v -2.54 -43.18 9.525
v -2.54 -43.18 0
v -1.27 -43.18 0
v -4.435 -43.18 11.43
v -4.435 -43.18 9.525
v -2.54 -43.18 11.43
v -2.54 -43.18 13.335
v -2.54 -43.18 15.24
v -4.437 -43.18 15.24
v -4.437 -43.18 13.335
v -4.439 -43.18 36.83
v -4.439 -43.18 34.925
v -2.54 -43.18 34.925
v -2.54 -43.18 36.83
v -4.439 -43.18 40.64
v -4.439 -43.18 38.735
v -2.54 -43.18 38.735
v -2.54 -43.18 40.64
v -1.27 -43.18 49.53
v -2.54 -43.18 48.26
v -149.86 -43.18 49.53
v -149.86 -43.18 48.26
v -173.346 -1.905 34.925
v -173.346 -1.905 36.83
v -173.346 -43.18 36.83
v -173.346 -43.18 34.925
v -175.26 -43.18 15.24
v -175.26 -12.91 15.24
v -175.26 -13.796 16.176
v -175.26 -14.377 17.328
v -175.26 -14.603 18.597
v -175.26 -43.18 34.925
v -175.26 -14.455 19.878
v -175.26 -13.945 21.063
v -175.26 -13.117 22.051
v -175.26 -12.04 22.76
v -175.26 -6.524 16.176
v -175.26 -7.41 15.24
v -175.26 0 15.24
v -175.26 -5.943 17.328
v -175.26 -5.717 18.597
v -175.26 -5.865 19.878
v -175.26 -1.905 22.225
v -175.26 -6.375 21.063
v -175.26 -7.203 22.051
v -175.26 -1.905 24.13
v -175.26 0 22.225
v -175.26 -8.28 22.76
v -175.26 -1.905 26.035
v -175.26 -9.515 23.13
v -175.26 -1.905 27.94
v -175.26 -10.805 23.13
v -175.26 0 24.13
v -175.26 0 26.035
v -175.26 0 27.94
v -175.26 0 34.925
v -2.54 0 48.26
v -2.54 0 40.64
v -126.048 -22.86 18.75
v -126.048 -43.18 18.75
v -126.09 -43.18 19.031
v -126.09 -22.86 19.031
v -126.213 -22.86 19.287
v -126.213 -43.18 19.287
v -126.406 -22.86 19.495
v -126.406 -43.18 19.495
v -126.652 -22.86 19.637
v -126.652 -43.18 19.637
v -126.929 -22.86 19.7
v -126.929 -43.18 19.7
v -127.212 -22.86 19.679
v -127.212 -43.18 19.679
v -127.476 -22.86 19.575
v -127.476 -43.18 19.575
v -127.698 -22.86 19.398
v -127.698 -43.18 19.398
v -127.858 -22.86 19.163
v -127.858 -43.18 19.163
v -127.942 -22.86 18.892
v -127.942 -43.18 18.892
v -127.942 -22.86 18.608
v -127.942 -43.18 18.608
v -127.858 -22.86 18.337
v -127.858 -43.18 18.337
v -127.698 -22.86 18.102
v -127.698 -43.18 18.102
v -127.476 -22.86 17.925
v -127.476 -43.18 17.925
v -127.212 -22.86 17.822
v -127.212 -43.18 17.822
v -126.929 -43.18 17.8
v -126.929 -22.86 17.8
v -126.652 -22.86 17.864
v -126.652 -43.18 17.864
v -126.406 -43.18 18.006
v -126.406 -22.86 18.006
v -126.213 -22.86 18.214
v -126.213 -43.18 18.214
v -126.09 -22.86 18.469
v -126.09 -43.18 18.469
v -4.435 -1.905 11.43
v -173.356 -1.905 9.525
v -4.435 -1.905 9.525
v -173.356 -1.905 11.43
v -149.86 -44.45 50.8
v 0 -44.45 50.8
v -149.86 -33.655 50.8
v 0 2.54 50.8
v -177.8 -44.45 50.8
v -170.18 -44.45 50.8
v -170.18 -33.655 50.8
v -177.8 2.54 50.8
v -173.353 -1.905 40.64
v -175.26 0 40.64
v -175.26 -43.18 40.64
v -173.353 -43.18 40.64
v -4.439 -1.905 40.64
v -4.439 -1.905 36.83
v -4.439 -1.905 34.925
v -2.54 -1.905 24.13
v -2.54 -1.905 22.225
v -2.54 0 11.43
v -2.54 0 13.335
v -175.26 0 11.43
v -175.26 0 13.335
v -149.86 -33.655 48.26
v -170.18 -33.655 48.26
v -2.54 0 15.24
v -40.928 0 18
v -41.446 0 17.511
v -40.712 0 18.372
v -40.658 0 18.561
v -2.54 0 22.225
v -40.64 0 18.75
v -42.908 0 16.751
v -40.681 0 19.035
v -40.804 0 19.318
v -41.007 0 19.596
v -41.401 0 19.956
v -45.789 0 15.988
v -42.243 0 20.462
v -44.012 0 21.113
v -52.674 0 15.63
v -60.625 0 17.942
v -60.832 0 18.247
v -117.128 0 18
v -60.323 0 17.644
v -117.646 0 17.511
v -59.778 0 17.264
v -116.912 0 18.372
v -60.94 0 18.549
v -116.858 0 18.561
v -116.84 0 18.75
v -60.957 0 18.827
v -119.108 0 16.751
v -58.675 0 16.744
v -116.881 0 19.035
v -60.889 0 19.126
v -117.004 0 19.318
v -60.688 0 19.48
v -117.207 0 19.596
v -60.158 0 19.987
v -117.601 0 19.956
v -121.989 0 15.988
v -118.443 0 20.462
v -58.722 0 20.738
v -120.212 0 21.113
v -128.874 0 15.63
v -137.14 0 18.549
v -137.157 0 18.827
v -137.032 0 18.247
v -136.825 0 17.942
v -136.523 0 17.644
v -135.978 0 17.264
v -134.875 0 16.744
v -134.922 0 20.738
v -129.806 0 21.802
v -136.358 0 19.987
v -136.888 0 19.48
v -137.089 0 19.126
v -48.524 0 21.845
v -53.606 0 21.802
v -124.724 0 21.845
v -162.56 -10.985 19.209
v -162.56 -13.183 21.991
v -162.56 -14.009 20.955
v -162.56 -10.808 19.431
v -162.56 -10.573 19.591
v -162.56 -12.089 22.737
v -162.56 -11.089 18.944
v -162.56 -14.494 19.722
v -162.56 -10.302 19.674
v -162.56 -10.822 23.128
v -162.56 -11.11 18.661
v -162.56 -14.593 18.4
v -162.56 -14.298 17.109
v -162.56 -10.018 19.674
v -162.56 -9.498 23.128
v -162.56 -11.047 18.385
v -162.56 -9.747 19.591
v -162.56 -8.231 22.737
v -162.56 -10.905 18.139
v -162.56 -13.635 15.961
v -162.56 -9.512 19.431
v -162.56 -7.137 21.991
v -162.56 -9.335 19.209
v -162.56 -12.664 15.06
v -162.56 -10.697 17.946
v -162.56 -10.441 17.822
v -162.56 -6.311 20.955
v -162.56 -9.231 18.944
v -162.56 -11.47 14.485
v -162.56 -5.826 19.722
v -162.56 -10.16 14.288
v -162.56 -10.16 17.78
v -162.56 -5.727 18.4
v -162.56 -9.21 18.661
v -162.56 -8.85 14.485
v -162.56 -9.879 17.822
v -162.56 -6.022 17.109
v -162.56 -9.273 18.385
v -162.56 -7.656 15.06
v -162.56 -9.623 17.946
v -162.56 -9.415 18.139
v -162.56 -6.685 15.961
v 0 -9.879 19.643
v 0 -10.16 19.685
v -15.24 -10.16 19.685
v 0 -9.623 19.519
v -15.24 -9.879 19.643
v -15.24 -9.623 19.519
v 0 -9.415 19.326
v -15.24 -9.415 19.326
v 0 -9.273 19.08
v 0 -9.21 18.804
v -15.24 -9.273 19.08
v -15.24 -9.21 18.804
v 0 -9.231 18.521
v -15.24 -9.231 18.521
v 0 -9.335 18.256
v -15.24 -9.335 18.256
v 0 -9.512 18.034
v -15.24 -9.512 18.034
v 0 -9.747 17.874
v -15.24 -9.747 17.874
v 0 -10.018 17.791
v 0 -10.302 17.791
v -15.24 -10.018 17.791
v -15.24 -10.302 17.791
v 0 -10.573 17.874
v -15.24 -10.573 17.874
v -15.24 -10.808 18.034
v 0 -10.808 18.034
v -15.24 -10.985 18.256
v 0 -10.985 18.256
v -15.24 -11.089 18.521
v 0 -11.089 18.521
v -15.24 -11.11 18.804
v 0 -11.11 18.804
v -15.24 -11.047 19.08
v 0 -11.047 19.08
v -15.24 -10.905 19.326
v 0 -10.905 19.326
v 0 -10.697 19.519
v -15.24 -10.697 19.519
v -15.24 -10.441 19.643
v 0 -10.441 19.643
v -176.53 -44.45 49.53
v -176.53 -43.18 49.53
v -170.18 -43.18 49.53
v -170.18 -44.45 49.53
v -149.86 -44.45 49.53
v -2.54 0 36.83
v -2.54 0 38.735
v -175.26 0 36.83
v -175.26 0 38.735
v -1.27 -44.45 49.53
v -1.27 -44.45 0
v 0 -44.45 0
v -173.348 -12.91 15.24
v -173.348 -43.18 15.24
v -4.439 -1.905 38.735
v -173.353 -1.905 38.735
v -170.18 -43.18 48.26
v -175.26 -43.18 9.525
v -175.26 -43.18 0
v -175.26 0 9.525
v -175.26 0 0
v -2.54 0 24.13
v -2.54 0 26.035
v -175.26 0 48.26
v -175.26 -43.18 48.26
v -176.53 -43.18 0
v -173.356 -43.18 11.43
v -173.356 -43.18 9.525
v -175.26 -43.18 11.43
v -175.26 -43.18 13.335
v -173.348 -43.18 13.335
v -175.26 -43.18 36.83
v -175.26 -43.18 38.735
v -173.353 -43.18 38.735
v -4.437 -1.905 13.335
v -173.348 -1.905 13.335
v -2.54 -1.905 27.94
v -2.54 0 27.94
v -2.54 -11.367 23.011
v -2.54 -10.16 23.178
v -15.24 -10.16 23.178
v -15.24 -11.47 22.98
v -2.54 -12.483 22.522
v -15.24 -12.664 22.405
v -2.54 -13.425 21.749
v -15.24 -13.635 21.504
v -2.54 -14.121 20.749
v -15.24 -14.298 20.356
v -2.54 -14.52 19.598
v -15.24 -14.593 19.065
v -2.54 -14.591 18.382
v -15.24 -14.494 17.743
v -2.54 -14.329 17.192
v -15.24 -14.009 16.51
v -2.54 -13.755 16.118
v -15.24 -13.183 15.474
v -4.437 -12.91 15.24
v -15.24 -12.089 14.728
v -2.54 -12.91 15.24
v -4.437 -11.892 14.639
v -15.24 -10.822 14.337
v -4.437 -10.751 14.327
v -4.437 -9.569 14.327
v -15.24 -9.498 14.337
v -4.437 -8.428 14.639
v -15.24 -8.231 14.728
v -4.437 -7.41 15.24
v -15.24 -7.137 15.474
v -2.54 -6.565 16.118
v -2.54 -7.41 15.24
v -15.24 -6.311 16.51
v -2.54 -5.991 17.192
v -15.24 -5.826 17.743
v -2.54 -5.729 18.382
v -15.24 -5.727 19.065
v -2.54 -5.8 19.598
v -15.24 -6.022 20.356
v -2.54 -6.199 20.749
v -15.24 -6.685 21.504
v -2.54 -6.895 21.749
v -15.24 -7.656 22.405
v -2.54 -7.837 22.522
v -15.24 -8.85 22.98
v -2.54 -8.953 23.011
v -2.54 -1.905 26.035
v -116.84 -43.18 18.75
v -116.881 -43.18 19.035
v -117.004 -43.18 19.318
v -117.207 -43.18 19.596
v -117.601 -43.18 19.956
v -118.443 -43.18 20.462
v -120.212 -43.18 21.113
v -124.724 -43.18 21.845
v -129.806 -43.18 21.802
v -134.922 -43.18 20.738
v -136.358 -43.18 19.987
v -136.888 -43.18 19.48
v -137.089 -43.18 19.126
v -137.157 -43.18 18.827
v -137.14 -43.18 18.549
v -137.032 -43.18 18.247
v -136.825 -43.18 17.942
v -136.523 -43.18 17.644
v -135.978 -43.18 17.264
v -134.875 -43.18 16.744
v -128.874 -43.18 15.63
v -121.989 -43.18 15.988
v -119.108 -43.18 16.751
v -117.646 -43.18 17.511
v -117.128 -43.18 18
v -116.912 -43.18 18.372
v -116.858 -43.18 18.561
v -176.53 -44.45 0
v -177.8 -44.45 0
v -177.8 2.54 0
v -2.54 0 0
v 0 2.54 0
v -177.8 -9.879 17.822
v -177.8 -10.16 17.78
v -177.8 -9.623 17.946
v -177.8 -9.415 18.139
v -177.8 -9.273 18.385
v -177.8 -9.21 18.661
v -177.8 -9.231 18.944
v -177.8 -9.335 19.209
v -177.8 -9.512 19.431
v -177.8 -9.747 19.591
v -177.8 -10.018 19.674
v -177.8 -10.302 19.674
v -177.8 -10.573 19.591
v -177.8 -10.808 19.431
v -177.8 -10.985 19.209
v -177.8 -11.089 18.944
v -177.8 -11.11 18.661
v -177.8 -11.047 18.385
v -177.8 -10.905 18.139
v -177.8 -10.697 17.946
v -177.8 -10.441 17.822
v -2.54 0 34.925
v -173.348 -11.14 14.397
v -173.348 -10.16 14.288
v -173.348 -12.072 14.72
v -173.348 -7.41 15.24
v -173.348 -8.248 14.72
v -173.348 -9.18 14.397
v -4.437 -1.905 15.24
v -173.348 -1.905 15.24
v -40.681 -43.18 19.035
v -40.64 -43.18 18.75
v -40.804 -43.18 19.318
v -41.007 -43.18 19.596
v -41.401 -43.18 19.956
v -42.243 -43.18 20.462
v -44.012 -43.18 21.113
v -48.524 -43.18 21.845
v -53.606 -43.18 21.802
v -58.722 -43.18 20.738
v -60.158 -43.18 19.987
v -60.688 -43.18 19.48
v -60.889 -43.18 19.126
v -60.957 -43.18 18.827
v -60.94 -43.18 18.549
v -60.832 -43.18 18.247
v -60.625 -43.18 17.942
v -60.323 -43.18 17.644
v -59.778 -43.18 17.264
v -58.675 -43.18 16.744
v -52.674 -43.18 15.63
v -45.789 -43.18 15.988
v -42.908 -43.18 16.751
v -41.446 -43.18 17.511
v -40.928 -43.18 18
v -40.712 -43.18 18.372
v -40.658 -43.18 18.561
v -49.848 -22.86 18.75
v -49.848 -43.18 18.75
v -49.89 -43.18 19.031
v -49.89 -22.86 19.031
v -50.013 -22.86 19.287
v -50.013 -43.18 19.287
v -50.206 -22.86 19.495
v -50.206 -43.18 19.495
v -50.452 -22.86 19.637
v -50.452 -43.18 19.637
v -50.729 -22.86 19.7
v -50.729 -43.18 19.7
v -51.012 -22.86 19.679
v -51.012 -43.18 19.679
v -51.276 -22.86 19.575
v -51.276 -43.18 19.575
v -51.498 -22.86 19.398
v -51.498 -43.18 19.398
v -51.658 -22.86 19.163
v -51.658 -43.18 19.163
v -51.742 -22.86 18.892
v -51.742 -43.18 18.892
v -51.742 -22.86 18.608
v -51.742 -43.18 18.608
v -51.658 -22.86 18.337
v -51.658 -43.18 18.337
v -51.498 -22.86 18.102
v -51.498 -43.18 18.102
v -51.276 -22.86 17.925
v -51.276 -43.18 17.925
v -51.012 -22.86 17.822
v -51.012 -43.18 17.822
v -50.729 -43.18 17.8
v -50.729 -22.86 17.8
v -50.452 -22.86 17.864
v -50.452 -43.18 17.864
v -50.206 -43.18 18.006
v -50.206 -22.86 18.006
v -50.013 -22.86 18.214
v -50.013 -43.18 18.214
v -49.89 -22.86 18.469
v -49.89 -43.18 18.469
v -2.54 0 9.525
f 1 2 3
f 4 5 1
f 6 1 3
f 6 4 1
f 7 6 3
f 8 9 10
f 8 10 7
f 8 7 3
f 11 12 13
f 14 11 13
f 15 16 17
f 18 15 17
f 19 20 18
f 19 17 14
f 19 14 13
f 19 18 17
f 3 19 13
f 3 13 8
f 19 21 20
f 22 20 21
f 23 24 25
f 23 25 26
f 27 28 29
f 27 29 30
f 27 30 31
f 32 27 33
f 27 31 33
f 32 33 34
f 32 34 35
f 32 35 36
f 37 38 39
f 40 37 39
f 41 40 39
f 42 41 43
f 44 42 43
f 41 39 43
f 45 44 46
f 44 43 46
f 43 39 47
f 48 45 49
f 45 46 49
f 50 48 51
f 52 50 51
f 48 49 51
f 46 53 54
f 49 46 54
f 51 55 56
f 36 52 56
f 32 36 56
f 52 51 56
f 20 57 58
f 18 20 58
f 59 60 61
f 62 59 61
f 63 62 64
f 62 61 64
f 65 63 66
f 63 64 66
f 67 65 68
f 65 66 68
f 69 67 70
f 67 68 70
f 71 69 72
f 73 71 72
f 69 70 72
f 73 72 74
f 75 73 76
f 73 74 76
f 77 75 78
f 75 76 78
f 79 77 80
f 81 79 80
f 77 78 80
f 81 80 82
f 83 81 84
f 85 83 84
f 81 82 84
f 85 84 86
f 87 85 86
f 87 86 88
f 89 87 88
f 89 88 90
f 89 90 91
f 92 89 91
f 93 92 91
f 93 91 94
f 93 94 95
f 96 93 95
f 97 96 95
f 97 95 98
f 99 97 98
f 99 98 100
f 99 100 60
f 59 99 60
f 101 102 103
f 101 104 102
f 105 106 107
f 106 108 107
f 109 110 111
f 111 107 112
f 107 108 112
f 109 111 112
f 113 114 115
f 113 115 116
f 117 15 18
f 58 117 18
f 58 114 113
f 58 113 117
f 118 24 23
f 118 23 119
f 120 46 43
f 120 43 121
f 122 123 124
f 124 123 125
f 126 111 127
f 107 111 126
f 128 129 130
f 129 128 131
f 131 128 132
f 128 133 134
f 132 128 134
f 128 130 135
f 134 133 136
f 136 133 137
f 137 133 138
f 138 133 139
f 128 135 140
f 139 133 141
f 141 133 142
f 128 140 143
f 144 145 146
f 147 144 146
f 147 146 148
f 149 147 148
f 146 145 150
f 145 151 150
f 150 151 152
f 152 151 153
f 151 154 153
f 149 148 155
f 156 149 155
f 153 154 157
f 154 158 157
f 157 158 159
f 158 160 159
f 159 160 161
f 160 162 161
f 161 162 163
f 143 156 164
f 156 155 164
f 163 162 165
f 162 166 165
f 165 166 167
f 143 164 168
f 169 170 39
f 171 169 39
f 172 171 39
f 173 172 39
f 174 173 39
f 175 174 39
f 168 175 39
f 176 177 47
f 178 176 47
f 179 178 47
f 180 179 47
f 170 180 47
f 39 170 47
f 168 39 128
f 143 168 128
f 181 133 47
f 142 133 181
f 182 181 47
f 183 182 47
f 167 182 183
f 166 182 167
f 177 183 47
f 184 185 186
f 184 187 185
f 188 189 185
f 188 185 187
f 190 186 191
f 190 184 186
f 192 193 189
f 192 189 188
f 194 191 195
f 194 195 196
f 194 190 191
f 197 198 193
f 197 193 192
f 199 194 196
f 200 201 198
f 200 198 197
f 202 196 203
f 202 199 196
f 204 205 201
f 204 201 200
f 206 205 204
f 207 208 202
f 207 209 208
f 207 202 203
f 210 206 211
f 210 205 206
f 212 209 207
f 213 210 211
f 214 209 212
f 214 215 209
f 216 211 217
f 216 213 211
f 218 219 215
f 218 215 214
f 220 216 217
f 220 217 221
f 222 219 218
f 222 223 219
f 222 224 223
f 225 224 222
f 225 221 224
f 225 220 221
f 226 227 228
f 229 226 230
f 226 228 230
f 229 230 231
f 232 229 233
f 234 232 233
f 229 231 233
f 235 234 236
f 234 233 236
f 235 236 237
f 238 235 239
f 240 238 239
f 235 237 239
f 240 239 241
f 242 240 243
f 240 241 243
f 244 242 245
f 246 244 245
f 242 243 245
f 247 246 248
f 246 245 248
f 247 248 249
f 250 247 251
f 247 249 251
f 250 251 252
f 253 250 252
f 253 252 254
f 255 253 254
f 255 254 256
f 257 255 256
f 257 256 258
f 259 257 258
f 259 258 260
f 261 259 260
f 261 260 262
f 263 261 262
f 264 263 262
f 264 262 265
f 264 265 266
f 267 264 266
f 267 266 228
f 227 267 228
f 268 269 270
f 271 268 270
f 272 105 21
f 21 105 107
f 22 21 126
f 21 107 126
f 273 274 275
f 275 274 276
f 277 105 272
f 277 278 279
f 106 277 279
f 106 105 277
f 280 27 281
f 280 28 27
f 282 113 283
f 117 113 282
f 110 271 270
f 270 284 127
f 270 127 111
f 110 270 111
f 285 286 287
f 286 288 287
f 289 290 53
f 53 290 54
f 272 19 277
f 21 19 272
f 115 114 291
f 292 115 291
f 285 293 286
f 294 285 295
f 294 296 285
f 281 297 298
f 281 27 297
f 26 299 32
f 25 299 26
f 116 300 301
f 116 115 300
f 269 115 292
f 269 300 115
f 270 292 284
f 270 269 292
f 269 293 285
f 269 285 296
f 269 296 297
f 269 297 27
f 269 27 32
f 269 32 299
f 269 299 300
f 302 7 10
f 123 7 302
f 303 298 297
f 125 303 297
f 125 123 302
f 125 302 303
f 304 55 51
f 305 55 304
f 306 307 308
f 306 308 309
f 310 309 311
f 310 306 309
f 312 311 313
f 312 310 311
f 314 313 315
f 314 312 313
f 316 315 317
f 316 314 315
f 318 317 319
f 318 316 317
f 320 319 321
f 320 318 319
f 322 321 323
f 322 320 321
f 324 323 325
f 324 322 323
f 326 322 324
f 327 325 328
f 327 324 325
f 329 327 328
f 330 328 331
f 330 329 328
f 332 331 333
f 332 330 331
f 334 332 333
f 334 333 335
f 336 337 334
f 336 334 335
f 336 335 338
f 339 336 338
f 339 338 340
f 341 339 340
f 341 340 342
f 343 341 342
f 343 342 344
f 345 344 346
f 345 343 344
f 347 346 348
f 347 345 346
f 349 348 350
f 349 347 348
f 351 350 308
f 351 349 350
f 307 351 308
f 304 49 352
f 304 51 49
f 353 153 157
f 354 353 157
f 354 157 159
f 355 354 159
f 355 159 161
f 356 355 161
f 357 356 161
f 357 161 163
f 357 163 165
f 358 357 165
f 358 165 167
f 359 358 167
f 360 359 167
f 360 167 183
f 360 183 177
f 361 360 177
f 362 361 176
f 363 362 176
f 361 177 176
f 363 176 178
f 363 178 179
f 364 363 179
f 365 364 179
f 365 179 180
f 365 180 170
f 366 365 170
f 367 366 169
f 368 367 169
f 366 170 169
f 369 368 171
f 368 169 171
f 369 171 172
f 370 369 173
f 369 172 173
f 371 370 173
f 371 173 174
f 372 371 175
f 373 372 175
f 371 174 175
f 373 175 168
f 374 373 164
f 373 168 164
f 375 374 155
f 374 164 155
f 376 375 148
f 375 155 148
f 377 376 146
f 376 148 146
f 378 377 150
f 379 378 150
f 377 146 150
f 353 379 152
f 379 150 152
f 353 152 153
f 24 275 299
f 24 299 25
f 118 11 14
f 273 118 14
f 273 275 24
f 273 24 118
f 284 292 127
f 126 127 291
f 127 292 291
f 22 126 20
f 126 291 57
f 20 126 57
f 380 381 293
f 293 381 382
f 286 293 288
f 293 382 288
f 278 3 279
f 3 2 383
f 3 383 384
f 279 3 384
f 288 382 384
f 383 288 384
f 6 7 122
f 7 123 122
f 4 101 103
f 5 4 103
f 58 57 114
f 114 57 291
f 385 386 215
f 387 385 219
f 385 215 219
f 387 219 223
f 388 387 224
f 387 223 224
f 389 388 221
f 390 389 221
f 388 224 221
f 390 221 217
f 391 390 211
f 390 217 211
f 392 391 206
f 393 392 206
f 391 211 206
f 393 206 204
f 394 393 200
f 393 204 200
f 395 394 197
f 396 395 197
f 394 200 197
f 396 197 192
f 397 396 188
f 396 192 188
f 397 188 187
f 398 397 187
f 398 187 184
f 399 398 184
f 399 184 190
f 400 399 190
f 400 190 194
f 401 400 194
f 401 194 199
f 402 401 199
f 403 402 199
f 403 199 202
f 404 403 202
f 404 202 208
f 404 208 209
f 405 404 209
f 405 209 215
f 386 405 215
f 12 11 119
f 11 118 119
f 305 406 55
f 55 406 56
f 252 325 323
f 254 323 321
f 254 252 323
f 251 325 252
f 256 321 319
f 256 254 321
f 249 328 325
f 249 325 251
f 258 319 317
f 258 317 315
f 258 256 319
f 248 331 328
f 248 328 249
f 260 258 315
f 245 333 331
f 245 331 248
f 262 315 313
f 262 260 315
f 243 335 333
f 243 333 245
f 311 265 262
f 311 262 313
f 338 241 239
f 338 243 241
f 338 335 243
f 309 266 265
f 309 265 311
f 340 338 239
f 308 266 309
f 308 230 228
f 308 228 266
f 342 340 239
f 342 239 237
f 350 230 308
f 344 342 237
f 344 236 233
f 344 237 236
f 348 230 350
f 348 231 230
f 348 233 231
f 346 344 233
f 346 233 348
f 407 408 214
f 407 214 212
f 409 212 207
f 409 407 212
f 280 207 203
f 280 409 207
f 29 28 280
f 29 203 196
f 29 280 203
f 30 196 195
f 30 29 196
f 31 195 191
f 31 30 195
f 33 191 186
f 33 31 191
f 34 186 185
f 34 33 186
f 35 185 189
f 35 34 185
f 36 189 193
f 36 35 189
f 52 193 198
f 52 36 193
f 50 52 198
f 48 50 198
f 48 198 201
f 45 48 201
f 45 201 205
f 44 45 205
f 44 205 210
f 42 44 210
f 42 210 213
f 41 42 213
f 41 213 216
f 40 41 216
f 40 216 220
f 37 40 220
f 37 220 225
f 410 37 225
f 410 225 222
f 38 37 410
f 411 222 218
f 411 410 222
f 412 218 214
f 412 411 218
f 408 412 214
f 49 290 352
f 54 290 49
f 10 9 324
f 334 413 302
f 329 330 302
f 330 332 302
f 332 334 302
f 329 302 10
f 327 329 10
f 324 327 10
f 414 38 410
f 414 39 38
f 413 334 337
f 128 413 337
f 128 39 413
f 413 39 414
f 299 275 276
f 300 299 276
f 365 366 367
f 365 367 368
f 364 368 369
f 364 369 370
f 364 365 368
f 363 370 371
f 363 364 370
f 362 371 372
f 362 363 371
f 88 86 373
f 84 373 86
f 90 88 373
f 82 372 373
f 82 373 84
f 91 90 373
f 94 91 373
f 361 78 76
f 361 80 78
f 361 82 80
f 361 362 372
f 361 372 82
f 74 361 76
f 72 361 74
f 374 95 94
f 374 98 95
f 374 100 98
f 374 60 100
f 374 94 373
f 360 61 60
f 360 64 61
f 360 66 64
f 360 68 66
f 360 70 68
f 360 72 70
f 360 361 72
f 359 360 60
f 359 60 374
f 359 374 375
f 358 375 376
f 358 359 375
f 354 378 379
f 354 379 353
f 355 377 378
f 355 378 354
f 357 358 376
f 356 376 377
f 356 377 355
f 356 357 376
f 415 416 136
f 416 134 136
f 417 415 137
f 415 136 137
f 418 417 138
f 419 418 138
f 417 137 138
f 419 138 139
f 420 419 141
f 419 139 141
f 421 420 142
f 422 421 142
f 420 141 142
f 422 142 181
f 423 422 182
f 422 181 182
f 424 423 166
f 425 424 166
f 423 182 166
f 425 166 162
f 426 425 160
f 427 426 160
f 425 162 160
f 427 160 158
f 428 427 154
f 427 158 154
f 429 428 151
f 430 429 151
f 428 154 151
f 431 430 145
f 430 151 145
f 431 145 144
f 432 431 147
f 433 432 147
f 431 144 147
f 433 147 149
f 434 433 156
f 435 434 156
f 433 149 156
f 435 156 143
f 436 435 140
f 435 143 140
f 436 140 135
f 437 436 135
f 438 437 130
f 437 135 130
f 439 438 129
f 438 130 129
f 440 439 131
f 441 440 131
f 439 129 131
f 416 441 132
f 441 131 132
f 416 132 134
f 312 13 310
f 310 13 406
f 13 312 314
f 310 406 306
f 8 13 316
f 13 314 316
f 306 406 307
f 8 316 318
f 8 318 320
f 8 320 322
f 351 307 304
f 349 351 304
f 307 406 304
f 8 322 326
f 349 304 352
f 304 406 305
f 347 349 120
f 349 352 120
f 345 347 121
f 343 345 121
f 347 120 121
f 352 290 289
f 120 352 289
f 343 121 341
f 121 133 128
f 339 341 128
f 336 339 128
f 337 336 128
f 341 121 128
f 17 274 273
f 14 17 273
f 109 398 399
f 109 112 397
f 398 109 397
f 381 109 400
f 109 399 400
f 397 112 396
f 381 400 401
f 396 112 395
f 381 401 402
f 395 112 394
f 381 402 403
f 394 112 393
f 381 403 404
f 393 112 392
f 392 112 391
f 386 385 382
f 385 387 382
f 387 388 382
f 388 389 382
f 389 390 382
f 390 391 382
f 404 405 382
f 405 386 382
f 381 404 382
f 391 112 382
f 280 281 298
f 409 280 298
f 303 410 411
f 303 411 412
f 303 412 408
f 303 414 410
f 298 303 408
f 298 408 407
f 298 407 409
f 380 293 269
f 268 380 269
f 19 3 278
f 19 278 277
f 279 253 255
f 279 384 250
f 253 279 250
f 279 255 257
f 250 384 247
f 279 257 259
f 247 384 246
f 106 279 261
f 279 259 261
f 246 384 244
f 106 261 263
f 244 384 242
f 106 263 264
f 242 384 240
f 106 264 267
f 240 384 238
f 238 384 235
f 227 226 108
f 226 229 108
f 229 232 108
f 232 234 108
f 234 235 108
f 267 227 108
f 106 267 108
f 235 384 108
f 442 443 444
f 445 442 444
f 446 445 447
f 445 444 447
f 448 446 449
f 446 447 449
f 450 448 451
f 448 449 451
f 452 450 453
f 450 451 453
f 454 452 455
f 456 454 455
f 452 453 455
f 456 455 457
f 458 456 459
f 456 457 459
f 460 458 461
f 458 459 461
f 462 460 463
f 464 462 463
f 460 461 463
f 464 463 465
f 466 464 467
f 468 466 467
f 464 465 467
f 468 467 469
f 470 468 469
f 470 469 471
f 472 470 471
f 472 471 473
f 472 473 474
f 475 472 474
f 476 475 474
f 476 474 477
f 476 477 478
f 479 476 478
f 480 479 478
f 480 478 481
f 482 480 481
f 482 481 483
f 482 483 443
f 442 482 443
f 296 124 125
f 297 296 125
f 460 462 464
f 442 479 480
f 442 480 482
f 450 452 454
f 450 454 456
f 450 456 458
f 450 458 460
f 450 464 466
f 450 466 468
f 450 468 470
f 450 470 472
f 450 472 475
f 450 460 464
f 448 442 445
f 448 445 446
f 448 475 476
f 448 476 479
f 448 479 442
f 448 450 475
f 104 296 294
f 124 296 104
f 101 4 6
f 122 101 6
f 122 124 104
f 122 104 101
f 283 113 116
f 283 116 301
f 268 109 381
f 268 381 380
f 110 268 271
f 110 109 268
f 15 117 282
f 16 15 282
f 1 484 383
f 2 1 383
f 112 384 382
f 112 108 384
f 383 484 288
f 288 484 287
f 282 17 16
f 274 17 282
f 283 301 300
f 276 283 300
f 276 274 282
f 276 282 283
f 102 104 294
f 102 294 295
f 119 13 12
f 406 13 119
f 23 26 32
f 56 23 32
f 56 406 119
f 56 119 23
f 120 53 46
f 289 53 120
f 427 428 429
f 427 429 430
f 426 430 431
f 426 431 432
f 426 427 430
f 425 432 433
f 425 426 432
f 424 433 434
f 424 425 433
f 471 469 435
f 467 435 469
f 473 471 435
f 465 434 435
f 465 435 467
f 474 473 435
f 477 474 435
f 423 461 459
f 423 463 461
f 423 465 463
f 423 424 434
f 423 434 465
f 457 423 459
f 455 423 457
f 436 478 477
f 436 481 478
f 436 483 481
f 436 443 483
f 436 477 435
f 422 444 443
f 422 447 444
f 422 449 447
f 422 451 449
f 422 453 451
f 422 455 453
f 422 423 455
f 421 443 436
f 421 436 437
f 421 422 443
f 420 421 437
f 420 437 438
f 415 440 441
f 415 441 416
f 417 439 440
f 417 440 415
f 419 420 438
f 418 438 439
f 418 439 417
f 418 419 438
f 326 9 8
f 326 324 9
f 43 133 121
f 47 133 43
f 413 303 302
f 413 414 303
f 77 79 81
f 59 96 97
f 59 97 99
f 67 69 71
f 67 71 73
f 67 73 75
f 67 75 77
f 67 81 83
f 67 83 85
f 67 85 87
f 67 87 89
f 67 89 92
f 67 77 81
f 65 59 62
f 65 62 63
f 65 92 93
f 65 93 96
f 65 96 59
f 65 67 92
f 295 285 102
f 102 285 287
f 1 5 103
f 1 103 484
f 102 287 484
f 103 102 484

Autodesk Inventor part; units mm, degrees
ref_plane "YZ Plane" through (0, 0, 0) normal (1, 0, 0) x (0, 1, 0)
ref_plane "XZ Plane" through (0, 0, 0) normal (0, 1, 0) x (-1, 0, 0)
ref_plane "XY Plane" through (0, 0, 0) normal (0, 0, 1) x (1, 0, 0)
sketch "Náčrt12" plane through (0, 0, 0) normal (0, 1, 0) x (-1, 0, 0)
  line L0 (0, 0) -> (177.8, 0)
  line L1 (177.8, 0) -> (177.8, 50.8)
  line L2 (177.8, 50.8) -> (0, 50.8)
  line L3 (0, 50.8) -> (0, 0)
  dimension "d34" = 50.8
  dimension "d35" = 177.8
extrude "Vysunutí10" add sketch "Náčrt12" along normal blind 2.54
sketch "Náčrt13" plane through (0, 0, 0) normal (0, -1, 0) x (1, 0, 0)
  line L0 (0, 50.8) -> (0, 0) projected
  line L1 (-177.8, 50.8) -> (0, 50.8) projected
  line L2 (-177.8, 0) -> (-177.8, 50.8) projected
  line L3 (0, 0) -> (-177.8, 0) projected
  line L4 (-175.26, 0) -> (-175.26, 48.26)
  line L5 (-175.26, 48.26) -> (-2.54, 48.26)
  line L6 (-2.54, 48.26) -> (-2.54, 0)
  line L7 (-175.26, 10.16) -> (-2.54, 10.16)
  line L8 (-2.54, 10.16) -> (-2.54, 7.62)
  line L9 (-2.54, 7.62) -> (-175.26, 7.62)
  line L10 (-175.26, 7.62) -> (-175.26, 10.16)
  line L11 (-175.26, 22.86) -> (-2.54, 22.86)
  line L12 (-2.54, 22.86) -> (-2.54, 20.32)
  line L13 (-2.54, 20.32) -> (-175.26, 20.32)
  line L14 (-175.26, 20.32) -> (-175.26, 22.86)
  line L15 (-175.26, 35.56) -> (-2.54, 35.56)
  line L16 (-2.54, 35.56) -> (-2.54, 33.02)
  line L17 (-2.54, 33.02) -> (-175.26, 33.02)
  line L18 (-175.26, 33.02) -> (-175.26, 35.56)
  line L19 (-175.26, 40.64) -> (-2.54, 40.64)
  line L20 (-2.54, 40.64) -> (-2.54, 38.1)
  line L21 (-2.54, 38.1) -> (-175.26, 38.1)
  line L22 (-175.26, 38.1) -> (-175.26, 40.64)
  line L23 (-175.26, 15.24) -> (-2.54, 15.24)
  line L24 (-2.54, 15.24) -> (-2.54, 12.7)
  line L25 (-2.54, 12.7) -> (-175.26, 12.7)
  line L26 (-175.26, 12.7) -> (-175.26, 15.24)
  line L27 (-175.26, 27.94) -> (-2.54, 27.94)
  line L28 (-2.54, 27.94) -> (-2.54, 25.4)
  line L29 (-2.54, 25.4) -> (-175.26, 25.4)
  line L30 (-175.26, 25.4) -> (-175.26, 27.94)
  dimension "d73" = 2.54
extrude "Vysunutí11" add sketch "Náčrt13" along normal blind 43.18 contours L0 L3 L6 L5 L4 L2 L1
sketch "Náčrt14" plane through (0, 0, 0) normal (0, -1, 0) x (1, 0, 0)
  line L0 (-2.54, 0) -> (-2.54, 48.26) projected
  line L1 (-175.26, 48.26) -> (-175.26, 0) projected
  line L2 (-2.54, 0) -> (-175.26, 0) projected
  line L3 (-175.26, 9.525) -> (-2.54, 9.525)
  line L4 (-2.54, 9.525) -> (-2.54, 11.43)
  line L5 (-2.54, 11.43) -> (-175.26, 11.43)
  line L6 (-175.26, 11.43) -> (-175.26, 9.525)
  line L7 (-175.26, 15.24) -> (-2.54, 15.24)
  line L8 (-2.54, 15.24) -> (-2.54, 13.335)
  line L9 (-2.54, 13.335) -> (-175.26, 13.335)
  line L10 (-175.26, 13.335) -> (-175.26, 15.24)
  line L11 (-175.26, 24.13) -> (-2.54, 24.13)
  line L12 (-2.54, 24.13) -> (-2.54, 22.225)
  line L13 (-2.54, 22.225) -> (-175.26, 22.225)
  line L14 (-175.26, 22.225) -> (-175.26, 24.13)
  line L15 (-175.26, 27.94) -> (-2.54, 27.94)
  line L16 (-2.54, 27.94) -> (-2.54, 26.035)
  line L17 (-2.54, 26.035) -> (-175.26, 26.035)
  line L18 (-175.26, 26.035) -> (-175.26, 27.94)
  line L19 (-175.26, 40.64) -> (-2.54, 40.64)
  line L20 (-2.54, 40.64) -> (-2.54, 38.735)
  line L21 (-2.54, 38.735) -> (-175.26, 38.735)
  line L22 (-175.26, 38.735) -> (-175.26, 40.64)
  line L23 (-175.26, 36.83) -> (-2.54, 36.83)
  line L24 (-2.54, 36.83) -> (-2.54, 34.925)
  line L25 (-2.54, 34.925) -> (-175.26, 34.925)
  line L26 (-175.26, 34.925) -> (-175.26, 36.83)
  point P0 (0, 0)
  dimension "d59" = 11.43
  dimension "d60" = 1.905
  dimension "d61" = 1.905
  dimension "d62" = 1.905
  dimension "d63" = 1.905
  dimension "d64" = 1.905
  dimension "d65" = 1.905
  dimension "d66" = 1.905
  dimension "d67" = 10.795
  dimension "d68" = 1.905
  dimension "d69" = 10.795
  dimension "d70" = 1.905
extrude "Vysunutí12" add sketch "Náčrt14" along normal blind 1.905 contours L3 L1 L5 L0 | L9 L1 L7 L0 | L13 L1 L11 L0 | L17 L1 L15 L0 | L25 L1 L23 L0 | L21 L1 L19 L0
sketch "Náčrt16" plane through (0, -1.905, 0) normal (0, -1, 0) x (1, 0, 0)
  line L0 (-2.54, 9.525) -> (-175.26, 9.525) projected
  line L1 (-175.26, 11.43) -> (-173.3563, 11.43)
  line L2 (-173.3563, 11.43) -> (-173.3563, 9.525)
  line L3 (-173.3563, 9.525) -> (-175.26, 9.525)
  line L4 (-175.26, 9.525) -> (-175.26, 11.43)
  line L5 (-2.54, 11.43) -> (-4.435, 11.43)
  line L6 (-4.435, 11.43) -> (-4.435, 9.525)
  line L7 (-4.435, 9.525) -> (-2.54, 9.525)
  line L8 (-2.54, 9.525) -> (-2.54, 11.43)
  point P0 (0, 0)
extrude "Vysunutí13" add sketch "Náčrt16" along normal up to surface (41.275 mm away)
sketch "Náčrt17" plane through (0, -1.905, 0) normal (0, -1, 0) x (1, 0, 0)
  line L0 (-2.54, 13.335) -> (-175.26, 13.335) projected
  line L1 (-175.26, 15.24) -> (-173.3476, 15.24)
  line L2 (-173.3476, 15.24) -> (-173.3476, 13.335)
  line L3 (-173.3476, 13.335) -> (-175.26, 13.335)
  line L4 (-175.26, 13.335) -> (-175.26, 15.24)
  line L5 (-2.54, 15.24) -> (-4.4371, 15.24)
  line L6 (-4.4371, 15.24) -> (-4.4371, 13.335)
  line L7 (-4.4371, 13.335) -> (-2.54, 13.335)
  line L8 (-2.54, 13.335) -> (-2.54, 15.24)
  point P0 (0, 0)
extrude "Vysunutí14" add sketch "Náčrt17" along normal up to surface (41.275 mm away)
sketch "Náčrt18" plane through (0, -1.905, 0) normal (0, -1, 0) x (1, 0, 0)
  line L0 (-175.26, 34.925) -> (-175.26, 36.83) projected
  line L1 (-175.26, 34.925) -> (-2.54, 34.925) projected
  line L2 (-175.26, 36.83) -> (-173.3455, 36.83)
  line L3 (-173.3455, 36.83) -> (-173.3455, 34.925)
  line L4 (-173.3455, 34.925) -> (-175.26, 34.925)
  line L5 (-175.26, 34.925) -> (-175.26, 36.83)
  line L6 (-2.54, 36.83) -> (-4.4393, 36.83)
  line L7 (-4.4393, 36.83) -> (-4.4393, 34.925)
  line L8 (-4.4393, 34.925) -> (-2.54, 34.925)
  line L9 (-2.54, 34.925) -> (-2.54, 36.83)
  point P0 (0, 0)
extrude "Vysunutí15" add sketch "Náčrt18" along normal up to surface (41.275 mm away)
sketch "Náčrt19" plane through (0, -1.905, 0) normal (0, -1, 0) x (1, 0, 0)
  line L0 (-175.26, 38.735) -> (-175.26, 40.64) projected
  line L1 (-2.54, 38.735) -> (-175.26, 38.735) projected
  line L2 (-175.26, 40.64) -> (-173.3529, 40.64)
  line L3 (-173.3529, 40.64) -> (-173.3529, 38.735)
  line L4 (-173.3529, 38.735) -> (-175.26, 38.735)
  line L5 (-175.26, 38.735) -> (-175.26, 40.64)
  line L6 (-2.54, 40.64) -> (-4.4393, 40.64)
  line L7 (-4.4393, 40.64) -> (-4.4393, 38.735)
  line L8 (-4.4393, 38.735) -> (-2.54, 38.735)
  line L9 (-2.54, 38.735) -> (-2.54, 40.64)
  point P0 (0, 0)
extrude "Vysunutí16" add sketch "Náčrt19" along normal up to surface (41.275 mm away)
sketch "Náčrt20" plane through (0, -43.18, 0) normal (0, -1, 0) x (1, 0, 0)
  line L0 (-175.26, 40.64) -> (-175.26, 48.26) projected
  line L1 (0, 50.8) -> (-177.8, 50.8) projected
  line L2 (-170.18, 50.8) -> (-149.86, 50.8)
  line L3 (-149.86, 50.8) -> (-149.86, 48.26)
  line L4 (-149.86, 48.26) -> (-170.18, 48.26)
  line L5 (-170.18, 48.26) -> (-170.18, 50.8)
  dimension "d83" = 20.32
  dimension "d84" = 25.4
extrude "Vysunutí17" cut sketch "Náčrt20" against normal blind 9.525
sketch "Náčrt21" plane through (0, 0, 0) normal (0, -1, 0) x (1, 0, 0)
  line L0 (-175.26, 15.24) -> (-2.54, 15.24) projected
  line L1 (-2.54, 13.335) -> (-175.26, 13.335) projected
  line L2 (-2.54, 24.13) -> (-175.26, 24.13) projected
  ellipse E0 centre (-127, 18.7502) end of major axis (-116.84, 18.7502) minor radius 3.175
  ellipse E1 centre (-50.8, 18.7502) end of major axis (-40.64, 18.7502) minor radius 3.175
  line L3 (-2.54, 0) -> (-175.26, 0) projected
  line L4 (-175.26, 22.225) -> (-175.26, 15.24) projected
  point P0 (0, 0)
  dimension "d92" = 10.16
  dimension "d93" = 10.16
  dimension "d122" = 3.175
  dimension "d120" = 18.7502
  dimension "d121" = 48.26
  dimension "d123" = 76.2
extrude "Vysunutí18" add sketch "Náčrt21" along normal up to surface (43.18 mm away)
sketch "Náčrt22" plane through (-127, -43.18, 18.7502) normal (0, -1, 0) x (1, 0, 0)
  ellipse E0 centre (0, 0) end of major axis (-10.16, 0) minor radius 3.175 projected
  circle A0 centre (0, 0) radius 0.9525
  point P0 (127, -18.7502)
  dimension "d96" = 1.905
extrude "Vysunutí19" cut sketch "Náčrt22" against normal blind 20.32 contours A0
sketch "Náčrt23" plane through (-50.8, -43.18, 18.7502) normal (0, -1, 0) x (1, 0, 0)
  ellipse E0 centre (0, 0) end of major axis (-10.16, 0) minor radius 3.175 projected
  circle A0 centre (0, 0) radius 0.9525
  point P0 (50.8, -18.7502)
  dimension "d99" = 1.905
extrude "Vysunutí20" cut sketch "Náčrt23" against normal blind 20.32 contours A0
sketch "Náčrt24" plane through (0, -43.18, 0) normal (0, -1, 0) x (1, 0, 0)
  line L0 (-149.86, 50.8) -> (-149.86, 48.26) projected
  line L1 (-2.54, 48.26) -> (-2.54, 40.64) projected
  line L2 (-2.54, 0) -> (0, 0) projected
  line L3 (0, 0) -> (0, 50.8) projected
  line L4 (0, 50.8) -> (-149.86, 50.8) projected
  line L5 (-1.27, 0) -> (-1.27, 49.53)
  line L6 (-1.27, 49.53) -> (-149.86, 49.53)
extrude "Vysunutí21" add sketch "Náčrt24" along normal blind 1.27
sketch "Náčrt25" plane through (0, -43.18, 0) normal (0, -1, 0) x (1, 0, 0)
  line L0 (-170.18, 48.26) -> (-170.18, 50.8) projected
  line L1 (-170.18, 50.8) -> (-177.8, 50.8) projected
  line L2 (-177.8, 50.8) -> (-177.8, 0) projected
  line L3 (-177.8, 0) -> (-175.26, 0) projected
  line L4 (-175.26, 48.26) -> (-170.18, 48.26) projected
  line L5 (-176.53, 0) -> (-176.53, 49.53)
  line L6 (-176.53, 49.53) -> (-170.18, 49.53)
  point P0 (0, 0)
extrude "Vysunutí22" add sketch "Náčrt25" along normal blind 1.27
sketch "Náčrt27" plane through (-2.54, 0, 27.94) normal (-1, 0, 0) x (0, 0, 1)
  circle A0 centre (-9.2075, -10.16) radius 4.445
  point P0 (-27.94, 0)
  dimension "d110" = 8.89
extrude "Vysunutí23" add sketch "Náčrt27" along normal blind 12.7
sketch "Náčrt28" plane through (-15.24, -10.16, 18.7325) normal (-1, 0, 0) x (0, 0, 1)
  circle A0 centre (0, 0) radius 4.445 projected
  circle A1 centre (0, 0) radius 0.9525
  point P0 (-18.7325, 10.16)
  dimension "d113" = 1.905
extrude "Vysunutí24" cut sketch "Náčrt28" against normal through all contours A1
sketch "Náčrt30" plane through (-175.26, 0, 22.225) normal (1, 0, 0) x (0, 0, -1)
  circle A0 centre (3.4925, -10.16) radius 4.445 projected
  point P0 (22.225, 0)
extrude "Vysunutí25" add sketch "Náčrt30" along normal blind 12.7
sketch "Náčrt31" plane through (-162.56, -10.16, 18.7325) normal (1, 0, 0) x (0, 0, -1)
  circle A0 centre (0, 0) radius 0.9525 projected
  point P0 (18.7325, 10.16)
extrude "Vysunutí26" cut sketch "Náčrt31" against normal through all
properties part number "Krabicka_dolna_cast"
